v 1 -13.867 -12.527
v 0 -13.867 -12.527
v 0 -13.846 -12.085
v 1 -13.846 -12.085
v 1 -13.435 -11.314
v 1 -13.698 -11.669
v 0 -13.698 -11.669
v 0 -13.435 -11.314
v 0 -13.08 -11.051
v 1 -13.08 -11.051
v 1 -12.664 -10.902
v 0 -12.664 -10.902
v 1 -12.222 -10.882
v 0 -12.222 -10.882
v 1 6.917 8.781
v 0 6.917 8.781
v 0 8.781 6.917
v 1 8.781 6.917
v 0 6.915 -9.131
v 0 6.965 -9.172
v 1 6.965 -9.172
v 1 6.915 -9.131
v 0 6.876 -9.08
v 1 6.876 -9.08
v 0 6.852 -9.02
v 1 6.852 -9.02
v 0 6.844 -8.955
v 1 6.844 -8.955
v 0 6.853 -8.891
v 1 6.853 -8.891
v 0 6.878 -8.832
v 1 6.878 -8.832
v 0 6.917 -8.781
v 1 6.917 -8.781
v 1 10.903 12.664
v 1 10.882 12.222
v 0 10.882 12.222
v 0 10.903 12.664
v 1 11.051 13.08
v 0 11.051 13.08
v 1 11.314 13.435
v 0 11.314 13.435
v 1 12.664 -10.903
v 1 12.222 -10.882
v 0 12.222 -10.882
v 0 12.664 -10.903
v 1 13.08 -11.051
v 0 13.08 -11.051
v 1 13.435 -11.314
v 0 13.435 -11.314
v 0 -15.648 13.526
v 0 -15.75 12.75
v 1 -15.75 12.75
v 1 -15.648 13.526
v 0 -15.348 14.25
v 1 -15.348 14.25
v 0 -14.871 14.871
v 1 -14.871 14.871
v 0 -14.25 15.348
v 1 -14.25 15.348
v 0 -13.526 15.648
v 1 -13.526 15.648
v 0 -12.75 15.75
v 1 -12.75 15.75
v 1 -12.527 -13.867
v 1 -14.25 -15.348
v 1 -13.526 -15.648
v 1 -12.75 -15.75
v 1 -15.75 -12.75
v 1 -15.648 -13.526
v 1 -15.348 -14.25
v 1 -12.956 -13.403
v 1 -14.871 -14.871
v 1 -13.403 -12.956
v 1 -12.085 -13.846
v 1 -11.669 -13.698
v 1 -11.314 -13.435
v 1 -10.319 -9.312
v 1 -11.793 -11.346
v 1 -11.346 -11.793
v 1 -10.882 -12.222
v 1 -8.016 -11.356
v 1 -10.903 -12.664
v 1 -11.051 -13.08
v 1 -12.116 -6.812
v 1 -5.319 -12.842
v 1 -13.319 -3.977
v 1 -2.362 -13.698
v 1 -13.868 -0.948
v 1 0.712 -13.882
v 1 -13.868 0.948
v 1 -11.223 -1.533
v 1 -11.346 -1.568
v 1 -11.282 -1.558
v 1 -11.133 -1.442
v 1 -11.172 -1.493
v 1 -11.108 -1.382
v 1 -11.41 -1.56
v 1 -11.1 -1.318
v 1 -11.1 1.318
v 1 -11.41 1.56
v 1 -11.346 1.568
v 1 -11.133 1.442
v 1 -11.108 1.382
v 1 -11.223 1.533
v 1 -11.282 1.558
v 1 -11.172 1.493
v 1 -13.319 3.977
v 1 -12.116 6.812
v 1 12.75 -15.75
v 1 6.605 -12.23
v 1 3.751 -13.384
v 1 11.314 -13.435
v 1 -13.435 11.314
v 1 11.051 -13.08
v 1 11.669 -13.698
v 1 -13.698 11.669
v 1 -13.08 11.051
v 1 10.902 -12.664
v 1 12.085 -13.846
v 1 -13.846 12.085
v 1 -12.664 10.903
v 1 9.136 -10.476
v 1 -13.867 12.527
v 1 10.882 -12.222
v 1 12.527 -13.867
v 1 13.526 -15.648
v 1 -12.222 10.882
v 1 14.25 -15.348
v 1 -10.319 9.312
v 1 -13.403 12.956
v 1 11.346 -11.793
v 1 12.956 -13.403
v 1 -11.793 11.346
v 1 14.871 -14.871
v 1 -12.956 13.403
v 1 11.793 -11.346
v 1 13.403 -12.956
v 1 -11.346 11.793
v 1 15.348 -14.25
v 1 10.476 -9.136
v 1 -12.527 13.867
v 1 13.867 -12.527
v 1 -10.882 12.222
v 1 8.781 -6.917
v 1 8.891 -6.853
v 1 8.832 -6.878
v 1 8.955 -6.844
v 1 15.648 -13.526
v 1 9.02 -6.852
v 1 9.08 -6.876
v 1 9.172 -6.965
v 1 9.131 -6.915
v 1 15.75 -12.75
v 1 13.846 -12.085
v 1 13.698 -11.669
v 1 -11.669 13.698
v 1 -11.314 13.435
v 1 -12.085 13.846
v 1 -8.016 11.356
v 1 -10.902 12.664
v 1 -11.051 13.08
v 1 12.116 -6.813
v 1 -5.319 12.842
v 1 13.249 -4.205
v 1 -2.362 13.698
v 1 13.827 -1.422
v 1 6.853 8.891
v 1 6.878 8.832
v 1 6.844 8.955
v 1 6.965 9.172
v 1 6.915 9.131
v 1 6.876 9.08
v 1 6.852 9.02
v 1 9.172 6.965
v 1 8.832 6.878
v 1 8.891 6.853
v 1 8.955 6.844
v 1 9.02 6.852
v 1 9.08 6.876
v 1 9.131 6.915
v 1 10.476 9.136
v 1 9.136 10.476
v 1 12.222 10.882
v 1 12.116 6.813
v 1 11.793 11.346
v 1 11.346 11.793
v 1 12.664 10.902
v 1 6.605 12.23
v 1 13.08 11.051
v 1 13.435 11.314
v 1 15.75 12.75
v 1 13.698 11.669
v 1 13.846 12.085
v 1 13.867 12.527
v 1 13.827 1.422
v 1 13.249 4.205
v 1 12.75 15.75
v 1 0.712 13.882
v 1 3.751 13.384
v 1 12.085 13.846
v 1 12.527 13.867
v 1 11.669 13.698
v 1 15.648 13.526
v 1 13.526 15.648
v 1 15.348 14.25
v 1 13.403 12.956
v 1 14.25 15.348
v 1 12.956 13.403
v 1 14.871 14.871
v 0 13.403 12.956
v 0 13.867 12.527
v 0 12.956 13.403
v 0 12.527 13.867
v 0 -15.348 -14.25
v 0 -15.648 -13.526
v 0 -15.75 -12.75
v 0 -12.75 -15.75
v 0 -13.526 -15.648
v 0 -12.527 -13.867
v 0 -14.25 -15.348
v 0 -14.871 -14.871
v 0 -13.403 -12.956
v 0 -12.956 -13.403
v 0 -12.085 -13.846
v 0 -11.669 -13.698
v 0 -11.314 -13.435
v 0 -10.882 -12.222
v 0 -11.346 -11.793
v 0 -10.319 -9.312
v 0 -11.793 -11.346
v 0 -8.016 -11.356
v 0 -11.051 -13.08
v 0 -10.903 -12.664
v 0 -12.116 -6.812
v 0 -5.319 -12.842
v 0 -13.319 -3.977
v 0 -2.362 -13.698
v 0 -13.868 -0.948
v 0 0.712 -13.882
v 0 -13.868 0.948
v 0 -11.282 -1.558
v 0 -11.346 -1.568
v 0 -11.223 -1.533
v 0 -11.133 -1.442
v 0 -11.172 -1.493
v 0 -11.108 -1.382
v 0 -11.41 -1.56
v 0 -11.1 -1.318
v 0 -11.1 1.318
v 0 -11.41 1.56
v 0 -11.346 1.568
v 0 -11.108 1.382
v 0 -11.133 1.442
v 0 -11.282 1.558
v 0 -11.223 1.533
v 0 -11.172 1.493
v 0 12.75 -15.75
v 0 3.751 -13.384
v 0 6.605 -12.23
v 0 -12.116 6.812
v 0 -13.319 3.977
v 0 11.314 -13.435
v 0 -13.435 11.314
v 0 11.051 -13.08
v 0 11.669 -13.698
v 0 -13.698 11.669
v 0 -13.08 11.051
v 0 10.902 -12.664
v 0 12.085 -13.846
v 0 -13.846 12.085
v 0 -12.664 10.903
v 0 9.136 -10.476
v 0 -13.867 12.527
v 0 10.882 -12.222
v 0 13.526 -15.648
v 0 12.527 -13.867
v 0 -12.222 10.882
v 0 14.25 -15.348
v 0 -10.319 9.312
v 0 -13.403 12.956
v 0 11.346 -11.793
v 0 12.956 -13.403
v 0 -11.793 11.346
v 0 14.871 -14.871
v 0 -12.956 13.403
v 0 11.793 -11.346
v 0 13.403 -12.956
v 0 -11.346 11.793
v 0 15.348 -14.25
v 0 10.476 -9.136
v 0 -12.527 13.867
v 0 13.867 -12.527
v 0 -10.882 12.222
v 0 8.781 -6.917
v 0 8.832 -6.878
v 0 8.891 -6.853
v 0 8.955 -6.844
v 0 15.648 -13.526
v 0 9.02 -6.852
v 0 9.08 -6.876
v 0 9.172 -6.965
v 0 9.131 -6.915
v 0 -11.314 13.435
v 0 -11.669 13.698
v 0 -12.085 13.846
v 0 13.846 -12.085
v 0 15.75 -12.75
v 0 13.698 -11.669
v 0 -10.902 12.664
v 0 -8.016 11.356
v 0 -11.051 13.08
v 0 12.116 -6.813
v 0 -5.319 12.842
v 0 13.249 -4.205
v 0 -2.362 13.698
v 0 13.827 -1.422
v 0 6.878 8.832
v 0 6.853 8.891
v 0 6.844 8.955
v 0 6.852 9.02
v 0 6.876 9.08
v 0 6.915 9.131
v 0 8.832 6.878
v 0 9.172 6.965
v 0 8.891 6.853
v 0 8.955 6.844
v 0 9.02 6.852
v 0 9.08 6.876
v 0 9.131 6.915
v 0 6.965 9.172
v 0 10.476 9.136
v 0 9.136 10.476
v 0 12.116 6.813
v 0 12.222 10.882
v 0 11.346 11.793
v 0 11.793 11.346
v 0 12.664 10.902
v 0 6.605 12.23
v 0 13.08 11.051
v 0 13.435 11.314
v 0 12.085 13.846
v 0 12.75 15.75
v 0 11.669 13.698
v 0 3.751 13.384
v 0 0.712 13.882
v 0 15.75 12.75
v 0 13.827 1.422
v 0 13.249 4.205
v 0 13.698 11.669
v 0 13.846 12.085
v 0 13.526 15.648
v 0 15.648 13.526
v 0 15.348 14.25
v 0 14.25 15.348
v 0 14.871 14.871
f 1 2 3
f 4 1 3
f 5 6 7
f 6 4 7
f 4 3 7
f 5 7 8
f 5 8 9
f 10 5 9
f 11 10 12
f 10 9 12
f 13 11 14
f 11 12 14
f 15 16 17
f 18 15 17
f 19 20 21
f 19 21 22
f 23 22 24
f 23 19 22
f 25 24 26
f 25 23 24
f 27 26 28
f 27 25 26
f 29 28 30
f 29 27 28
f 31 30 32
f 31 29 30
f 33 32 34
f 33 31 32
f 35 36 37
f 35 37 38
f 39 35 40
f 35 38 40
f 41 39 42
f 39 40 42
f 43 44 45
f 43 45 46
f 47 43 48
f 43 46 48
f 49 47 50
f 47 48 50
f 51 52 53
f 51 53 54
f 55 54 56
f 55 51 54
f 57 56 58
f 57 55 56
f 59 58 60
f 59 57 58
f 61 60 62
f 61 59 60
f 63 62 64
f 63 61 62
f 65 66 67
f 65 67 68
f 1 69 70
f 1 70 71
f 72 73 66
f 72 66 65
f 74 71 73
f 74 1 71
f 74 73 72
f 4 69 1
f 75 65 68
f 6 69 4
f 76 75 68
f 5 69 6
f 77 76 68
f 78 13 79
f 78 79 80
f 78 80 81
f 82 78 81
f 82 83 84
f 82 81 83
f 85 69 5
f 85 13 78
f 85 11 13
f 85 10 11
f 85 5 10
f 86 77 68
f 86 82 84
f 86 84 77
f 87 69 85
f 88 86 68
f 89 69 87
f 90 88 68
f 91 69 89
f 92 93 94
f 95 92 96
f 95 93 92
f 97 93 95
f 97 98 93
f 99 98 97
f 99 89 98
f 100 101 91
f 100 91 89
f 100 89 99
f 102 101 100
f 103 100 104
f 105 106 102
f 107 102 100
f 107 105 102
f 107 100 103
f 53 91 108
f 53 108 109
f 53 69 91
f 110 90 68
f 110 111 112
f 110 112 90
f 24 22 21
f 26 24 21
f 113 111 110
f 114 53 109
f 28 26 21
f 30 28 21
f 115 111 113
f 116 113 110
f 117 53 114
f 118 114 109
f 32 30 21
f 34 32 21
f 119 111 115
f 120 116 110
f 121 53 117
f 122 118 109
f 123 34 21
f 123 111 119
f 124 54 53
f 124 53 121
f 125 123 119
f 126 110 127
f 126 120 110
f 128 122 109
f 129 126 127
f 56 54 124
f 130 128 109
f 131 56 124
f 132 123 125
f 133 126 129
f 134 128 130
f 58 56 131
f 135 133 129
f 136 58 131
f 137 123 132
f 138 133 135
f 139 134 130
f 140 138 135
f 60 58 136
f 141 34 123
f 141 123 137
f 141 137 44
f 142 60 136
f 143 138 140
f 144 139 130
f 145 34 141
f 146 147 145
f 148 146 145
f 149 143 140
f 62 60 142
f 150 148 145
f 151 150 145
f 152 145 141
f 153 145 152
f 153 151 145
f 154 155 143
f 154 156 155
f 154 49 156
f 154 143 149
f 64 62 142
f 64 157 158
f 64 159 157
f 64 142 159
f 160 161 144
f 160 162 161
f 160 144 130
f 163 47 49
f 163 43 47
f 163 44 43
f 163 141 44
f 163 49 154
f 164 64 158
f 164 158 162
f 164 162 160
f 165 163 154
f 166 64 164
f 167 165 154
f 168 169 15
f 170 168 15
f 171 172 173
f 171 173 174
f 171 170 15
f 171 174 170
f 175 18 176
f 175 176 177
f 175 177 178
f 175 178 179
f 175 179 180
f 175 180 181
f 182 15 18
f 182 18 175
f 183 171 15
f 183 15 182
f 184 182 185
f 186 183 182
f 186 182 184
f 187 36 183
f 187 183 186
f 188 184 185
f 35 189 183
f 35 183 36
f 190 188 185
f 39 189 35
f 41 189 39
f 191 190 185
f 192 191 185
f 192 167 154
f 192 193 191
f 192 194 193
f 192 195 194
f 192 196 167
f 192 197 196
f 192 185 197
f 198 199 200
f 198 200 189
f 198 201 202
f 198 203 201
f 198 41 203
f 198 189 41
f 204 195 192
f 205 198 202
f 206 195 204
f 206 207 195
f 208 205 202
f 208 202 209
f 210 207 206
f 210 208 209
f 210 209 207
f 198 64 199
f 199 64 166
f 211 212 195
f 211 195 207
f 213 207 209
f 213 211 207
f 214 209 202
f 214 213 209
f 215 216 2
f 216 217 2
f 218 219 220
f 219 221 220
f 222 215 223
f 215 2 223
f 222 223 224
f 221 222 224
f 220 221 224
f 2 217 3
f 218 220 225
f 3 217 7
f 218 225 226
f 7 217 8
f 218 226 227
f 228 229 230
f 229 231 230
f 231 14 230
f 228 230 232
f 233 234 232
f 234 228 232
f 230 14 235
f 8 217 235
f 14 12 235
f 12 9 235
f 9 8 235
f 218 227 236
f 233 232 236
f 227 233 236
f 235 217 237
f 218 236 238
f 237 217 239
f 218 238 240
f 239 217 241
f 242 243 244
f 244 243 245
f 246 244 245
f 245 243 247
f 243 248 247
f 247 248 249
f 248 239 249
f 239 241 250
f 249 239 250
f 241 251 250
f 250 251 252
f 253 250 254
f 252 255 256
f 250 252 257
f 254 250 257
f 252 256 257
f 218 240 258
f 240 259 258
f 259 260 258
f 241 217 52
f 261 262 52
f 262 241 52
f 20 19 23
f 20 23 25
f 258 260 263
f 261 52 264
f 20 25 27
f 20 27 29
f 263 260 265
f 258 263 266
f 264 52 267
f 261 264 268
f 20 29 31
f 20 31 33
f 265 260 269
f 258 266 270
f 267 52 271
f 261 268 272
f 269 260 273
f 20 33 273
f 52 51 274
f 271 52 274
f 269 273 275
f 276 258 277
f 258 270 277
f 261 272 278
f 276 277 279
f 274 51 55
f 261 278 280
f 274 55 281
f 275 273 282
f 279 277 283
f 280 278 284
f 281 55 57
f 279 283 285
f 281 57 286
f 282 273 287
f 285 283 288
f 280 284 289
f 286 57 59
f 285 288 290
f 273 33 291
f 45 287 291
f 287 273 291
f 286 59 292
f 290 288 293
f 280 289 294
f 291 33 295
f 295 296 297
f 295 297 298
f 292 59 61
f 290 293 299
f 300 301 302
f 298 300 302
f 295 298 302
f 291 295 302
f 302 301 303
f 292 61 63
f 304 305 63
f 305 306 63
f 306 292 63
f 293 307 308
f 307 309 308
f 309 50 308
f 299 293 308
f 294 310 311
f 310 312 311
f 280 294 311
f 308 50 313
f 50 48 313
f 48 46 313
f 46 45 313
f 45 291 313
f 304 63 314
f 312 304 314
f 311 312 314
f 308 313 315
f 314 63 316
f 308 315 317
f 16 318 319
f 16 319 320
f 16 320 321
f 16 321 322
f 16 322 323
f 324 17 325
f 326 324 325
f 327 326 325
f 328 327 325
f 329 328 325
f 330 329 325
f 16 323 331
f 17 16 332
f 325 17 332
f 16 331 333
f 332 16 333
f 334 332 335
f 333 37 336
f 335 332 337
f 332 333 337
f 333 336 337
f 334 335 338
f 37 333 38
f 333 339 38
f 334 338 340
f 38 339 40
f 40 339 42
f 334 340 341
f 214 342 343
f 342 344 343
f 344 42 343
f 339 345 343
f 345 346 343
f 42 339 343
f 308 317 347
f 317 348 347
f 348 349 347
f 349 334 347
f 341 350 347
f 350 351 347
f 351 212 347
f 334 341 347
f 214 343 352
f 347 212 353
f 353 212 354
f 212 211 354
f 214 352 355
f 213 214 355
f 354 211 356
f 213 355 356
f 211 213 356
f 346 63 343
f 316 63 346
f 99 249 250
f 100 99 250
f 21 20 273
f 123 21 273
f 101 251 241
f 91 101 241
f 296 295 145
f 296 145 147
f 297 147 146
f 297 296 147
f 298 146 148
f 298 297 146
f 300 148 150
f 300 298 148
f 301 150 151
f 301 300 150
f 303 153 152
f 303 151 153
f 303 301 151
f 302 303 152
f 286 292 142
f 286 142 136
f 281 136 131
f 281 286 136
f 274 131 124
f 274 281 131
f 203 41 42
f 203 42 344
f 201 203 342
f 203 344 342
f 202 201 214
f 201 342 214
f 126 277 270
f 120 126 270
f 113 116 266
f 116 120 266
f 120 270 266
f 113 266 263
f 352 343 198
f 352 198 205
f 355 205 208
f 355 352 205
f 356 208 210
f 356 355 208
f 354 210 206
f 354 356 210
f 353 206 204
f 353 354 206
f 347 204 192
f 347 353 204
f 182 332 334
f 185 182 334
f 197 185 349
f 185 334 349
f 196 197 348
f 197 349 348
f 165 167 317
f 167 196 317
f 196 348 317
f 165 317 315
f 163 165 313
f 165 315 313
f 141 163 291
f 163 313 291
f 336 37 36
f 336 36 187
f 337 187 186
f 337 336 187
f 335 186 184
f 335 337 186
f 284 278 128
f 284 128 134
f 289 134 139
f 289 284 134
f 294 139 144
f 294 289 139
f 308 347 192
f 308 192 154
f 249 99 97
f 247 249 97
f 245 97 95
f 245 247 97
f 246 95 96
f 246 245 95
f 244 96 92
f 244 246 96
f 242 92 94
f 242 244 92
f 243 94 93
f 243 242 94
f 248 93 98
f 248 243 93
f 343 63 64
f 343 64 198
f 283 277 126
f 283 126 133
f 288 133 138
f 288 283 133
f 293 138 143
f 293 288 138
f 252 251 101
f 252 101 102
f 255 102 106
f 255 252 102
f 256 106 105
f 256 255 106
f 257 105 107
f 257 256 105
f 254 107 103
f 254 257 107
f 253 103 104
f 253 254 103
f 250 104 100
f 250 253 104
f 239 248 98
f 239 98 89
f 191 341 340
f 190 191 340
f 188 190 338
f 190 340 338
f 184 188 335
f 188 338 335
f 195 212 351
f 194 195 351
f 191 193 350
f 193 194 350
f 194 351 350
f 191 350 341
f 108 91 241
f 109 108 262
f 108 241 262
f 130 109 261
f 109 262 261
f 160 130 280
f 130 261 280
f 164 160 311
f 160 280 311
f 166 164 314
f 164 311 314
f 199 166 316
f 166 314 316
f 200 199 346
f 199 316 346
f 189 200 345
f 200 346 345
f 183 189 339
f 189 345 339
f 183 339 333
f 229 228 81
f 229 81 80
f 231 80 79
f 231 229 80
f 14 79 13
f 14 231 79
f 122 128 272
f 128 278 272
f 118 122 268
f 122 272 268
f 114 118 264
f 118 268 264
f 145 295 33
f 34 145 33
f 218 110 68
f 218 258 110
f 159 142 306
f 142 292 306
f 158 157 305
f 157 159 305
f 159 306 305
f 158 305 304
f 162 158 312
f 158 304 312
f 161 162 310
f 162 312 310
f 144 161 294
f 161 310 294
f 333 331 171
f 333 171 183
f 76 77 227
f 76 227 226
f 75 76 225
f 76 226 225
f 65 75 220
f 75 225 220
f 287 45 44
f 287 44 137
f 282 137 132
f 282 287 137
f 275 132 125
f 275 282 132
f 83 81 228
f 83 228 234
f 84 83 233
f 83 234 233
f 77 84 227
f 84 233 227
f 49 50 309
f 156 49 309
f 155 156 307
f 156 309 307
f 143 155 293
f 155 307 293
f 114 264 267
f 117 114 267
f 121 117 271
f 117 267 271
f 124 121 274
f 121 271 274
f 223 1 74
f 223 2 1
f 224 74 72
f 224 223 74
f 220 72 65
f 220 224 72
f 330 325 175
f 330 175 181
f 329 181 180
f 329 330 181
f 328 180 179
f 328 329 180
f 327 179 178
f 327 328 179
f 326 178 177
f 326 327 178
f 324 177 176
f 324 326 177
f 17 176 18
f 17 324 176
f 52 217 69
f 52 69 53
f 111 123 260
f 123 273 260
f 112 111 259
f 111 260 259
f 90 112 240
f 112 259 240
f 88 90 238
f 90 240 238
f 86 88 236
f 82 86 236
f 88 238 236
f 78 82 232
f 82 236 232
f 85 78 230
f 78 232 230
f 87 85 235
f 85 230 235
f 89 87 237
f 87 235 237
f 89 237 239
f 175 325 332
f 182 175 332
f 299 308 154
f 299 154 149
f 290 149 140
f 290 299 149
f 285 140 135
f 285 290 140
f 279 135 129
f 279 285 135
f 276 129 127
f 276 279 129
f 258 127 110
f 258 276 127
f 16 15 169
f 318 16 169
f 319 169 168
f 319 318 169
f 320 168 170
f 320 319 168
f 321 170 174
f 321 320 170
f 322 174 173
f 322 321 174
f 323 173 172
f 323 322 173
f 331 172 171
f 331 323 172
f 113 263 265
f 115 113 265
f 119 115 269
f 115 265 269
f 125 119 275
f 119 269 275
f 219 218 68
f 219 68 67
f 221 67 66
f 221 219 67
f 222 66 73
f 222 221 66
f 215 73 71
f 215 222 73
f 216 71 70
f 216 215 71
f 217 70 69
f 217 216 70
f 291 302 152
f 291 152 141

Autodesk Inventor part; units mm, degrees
ref_plane "YZ Plane" through (0, 0, 0) normal (1, 0, 0) x (0, 1, 0)
ref_plane "XZ Plane" through (0, 0, 0) normal (0, 1, 0) x (-1, 0, 0)
ref_plane "XY Plane" through (0, 0, 0) normal (0, 0, 1) x (1, 0, 0)
sketch "Sketch1" plane through (0, 0, 0) normal (1, 0, 0) x (0, 1, 0)
  line L0 (-12.75, 15.75) -> (12.75, 15.75)
  line L1 (15.75, 12.75) -> (15.75, -12.75)
  line L2 (12.75, -15.75) -> (-12.75, -15.75)
  line L3 (-15.75, -12.75) -> (-15.75, 12.75)
  line L4 (-15.75, 15.75) -> (15.75, -15.75) construction
  line L5 (15.75, 15.75) -> (-15.75, -15.75) construction
  line L6 (15.75, 15.75) -> (-15.75, -15.75)
  line L7 (7.9011, 23.5989) -> (-23.5989, -7.9011)
  circle A0 centre (0, 0) radius 17.5 construction
  line L8 (28.1244, 3.3756) -> (-3.3756, -28.1244) construction
  arc A1 (10.8821, -12.2221) -> (11.3137, -13.435) centre (12.3744, -12.3744) ccw
  arc A2 (13.435, -11.3137) -> (12.2221, -10.8821) centre (12.3744, -12.3744) ccw
  arc A3 (10.8821, -12.2221) -> (12.2221, -10.8821) centre (0, 0) ccw
  arc A4 (11.3137, -13.435) -> (12.5266, -13.8666) centre (12.3744, -12.3744) ccw
  arc A5 (13.8666, -12.5266) -> (13.435, -11.3137) centre (12.3744, -12.3744) ccw
  arc A6 (13.8666, -12.5266) -> (12.5266, -13.8666) centre (24.7487, -24.7487) ccw
  arc A7 (12.5266, 13.8666) -> (11.3137, 13.435) centre (12.3744, 12.3744) ccw
  arc A8 (12.5266, 13.8666) -> (13.8666, 12.5266) centre (24.7487, 24.7487) ccw
  arc A9 (13.435, 11.3137) -> (13.8666, 12.5266) centre (12.3744, 12.3744) ccw
  arc A10 (12.2221, 10.8821) -> (13.435, 11.3137) centre (12.3744, 12.3744) ccw
  arc A11 (12.2221, 10.8821) -> (10.8821, 12.2221) centre (0, 0) ccw
  arc A12 (11.3137, 13.435) -> (10.8821, 12.2221) centre (12.3744, 12.3744) ccw
  arc A13 (-13.8666, 12.5266) -> (-13.435, 11.3137) centre (-12.3744, 12.3744) ccw
  arc A14 (-13.8666, 12.5266) -> (-12.5266, 13.8666) centre (-24.7487, 24.7487) ccw
  arc A15 (-11.3137, 13.435) -> (-12.5266, 13.8666) centre (-12.3744, 12.3744) ccw
  arc A16 (-10.8821, 12.2221) -> (-11.3137, 13.435) centre (-12.3744, 12.3744) ccw
  arc A17 (-10.8821, 12.2221) -> (-12.2221, 10.8821) centre (0, 0) ccw
  arc A18 (-13.435, 11.3137) -> (-12.2221, 10.8821) centre (-12.3744, 12.3744) ccw
  arc A19 (-12.5266, -13.8666) -> (-11.3137, -13.435) centre (-12.3744, -12.3744) ccw
  arc A20 (-12.5266, -13.8666) -> (-13.8666, -12.5266) centre (-24.7487, -24.7487) ccw
  arc A21 (-13.435, -11.3137) -> (-13.8666, -12.5266) centre (-12.3744, -12.3744) ccw
  arc A22 (-12.2221, -10.8821) -> (-13.435, -11.3137) centre (-12.3744, -12.3744) ccw
  arc A23 (-12.2221, -10.8821) -> (-10.8821, -12.2221) centre (0, 0) ccw
  arc A24 (-11.3137, -13.435) -> (-10.8821, -12.2221) centre (-12.3744, -12.3744) ccw
  arc A25 (15.75, 12.75) -> (12.75, 15.75) centre (12.75, 12.75) ccw
  arc A26 (-12.75, 15.75) -> (-15.75, 12.75) centre (-12.75, 12.75) ccw
  arc A27 (-15.75, -12.75) -> (-12.75, -15.75) centre (-12.75, -12.75) ccw
  arc A28 (12.75, -15.75) -> (15.75, -12.75) centre (12.75, -12.75) ccw
  line L9 (9.1716, -6.9652) -> (10.4759, -9.1359)
  line L10 (-15.0803, 16.4203) -> (16.4197, -15.0797) construction
  line L11 (6.9652, -9.1716) -> (9.1359, -10.4759)
  line L12 (-16.4203, 15.0803) -> (15.0797, -16.4197) construction
  line L13 (23.5989, 7.9011) -> (15.75, 0.0522)
  line L14 (8.7806, -6.9172) -> (6.9172, -8.7806)
  arc A29 (9.1716, -6.9652) -> (8.7806, -6.9172) centre (8.9573, -7.094) ccw
  arc A30 (6.9172, -8.7806) -> (6.9652, -9.1716) centre (7.094, -8.9573) ccw
  line L15 (9.1716, 6.9652) -> (10.4759, 9.1359)
  arc A31 (8.7806, 6.9172) -> (9.1716, 6.9652) centre (8.9573, 7.094) ccw
  line L16 (6.9172, 8.7806) -> (8.7806, 6.9172)
  arc A32 (6.9652, 9.1716) -> (6.9172, 8.7806) centre (7.094, 8.9573) ccw
  line L17 (6.9652, 9.1716) -> (9.1359, 10.4759)
  line L18 (-11.4105, 1.5602) -> (-13.8677, 0.9475)
  arc A33 (-11.1, 1.3176) -> (-11.4105, 1.5602) centre (-11.35, 1.3176) ccw
  arc A34 (-11.4105, -1.5602) -> (-11.1, -1.3176) centre (-11.35, -1.3176) ccw
  line L19 (-11.1, -1.3176) -> (-11.1, 1.3176)
  line L20 (-11.4105, -1.5602) -> (-13.8677, -0.9475)
  arc A35 (10.4759, -9.1359) -> (10.4759, 9.1359) centre (0, 0) ccw
  arc A36 (9.1359, 10.4759) -> (-13.8677, 0.9475) centre (0, 0) ccw
  arc A37 (-13.8677, -0.9475) -> (9.1359, -10.4759) centre (0, 0) ccw
  point P0 (9.0068, -6.691)
  point P1 (6.691, -9.0068)
  point P2 (9.0068, 6.691)
  point P3 (6.691, 9.0068)
  point P4 (-11.1, 1.6376)
  point P5 (-11.1, -1.6376)
  dimension "d10" = 35
  dimension "d0" = 31.5
  dimension "d1" = 31.5
  dimension "d4" = 11.1
  dimension "d17" = 360
  dimension "d19" = 3
  dimension "d21" = 0.25
  dimension "d22" = 0.25
  dimension "d25" = 90
  dimension "d29" = 135
extrude "Extrusion1" add sketch "Sketch1" along normal blind 1 contours L0 L7 A36 L3 A26 | L0 A25 L6 A8 A7 A12 A11 L16 A32 L17 A36 L7 | L7 A36 L18 A33 L19 A34 L20 A37 L6 A23 A22 A21 A20 A27 L3 | A25 L1 A28 L2 A27 L6 A20 A19 A24 A23 A37 L11 A30 L14 A29 L9 A35 L15 A31 L16 A11 A10 A9 A8
properties part number "Harting Gasket 1"
